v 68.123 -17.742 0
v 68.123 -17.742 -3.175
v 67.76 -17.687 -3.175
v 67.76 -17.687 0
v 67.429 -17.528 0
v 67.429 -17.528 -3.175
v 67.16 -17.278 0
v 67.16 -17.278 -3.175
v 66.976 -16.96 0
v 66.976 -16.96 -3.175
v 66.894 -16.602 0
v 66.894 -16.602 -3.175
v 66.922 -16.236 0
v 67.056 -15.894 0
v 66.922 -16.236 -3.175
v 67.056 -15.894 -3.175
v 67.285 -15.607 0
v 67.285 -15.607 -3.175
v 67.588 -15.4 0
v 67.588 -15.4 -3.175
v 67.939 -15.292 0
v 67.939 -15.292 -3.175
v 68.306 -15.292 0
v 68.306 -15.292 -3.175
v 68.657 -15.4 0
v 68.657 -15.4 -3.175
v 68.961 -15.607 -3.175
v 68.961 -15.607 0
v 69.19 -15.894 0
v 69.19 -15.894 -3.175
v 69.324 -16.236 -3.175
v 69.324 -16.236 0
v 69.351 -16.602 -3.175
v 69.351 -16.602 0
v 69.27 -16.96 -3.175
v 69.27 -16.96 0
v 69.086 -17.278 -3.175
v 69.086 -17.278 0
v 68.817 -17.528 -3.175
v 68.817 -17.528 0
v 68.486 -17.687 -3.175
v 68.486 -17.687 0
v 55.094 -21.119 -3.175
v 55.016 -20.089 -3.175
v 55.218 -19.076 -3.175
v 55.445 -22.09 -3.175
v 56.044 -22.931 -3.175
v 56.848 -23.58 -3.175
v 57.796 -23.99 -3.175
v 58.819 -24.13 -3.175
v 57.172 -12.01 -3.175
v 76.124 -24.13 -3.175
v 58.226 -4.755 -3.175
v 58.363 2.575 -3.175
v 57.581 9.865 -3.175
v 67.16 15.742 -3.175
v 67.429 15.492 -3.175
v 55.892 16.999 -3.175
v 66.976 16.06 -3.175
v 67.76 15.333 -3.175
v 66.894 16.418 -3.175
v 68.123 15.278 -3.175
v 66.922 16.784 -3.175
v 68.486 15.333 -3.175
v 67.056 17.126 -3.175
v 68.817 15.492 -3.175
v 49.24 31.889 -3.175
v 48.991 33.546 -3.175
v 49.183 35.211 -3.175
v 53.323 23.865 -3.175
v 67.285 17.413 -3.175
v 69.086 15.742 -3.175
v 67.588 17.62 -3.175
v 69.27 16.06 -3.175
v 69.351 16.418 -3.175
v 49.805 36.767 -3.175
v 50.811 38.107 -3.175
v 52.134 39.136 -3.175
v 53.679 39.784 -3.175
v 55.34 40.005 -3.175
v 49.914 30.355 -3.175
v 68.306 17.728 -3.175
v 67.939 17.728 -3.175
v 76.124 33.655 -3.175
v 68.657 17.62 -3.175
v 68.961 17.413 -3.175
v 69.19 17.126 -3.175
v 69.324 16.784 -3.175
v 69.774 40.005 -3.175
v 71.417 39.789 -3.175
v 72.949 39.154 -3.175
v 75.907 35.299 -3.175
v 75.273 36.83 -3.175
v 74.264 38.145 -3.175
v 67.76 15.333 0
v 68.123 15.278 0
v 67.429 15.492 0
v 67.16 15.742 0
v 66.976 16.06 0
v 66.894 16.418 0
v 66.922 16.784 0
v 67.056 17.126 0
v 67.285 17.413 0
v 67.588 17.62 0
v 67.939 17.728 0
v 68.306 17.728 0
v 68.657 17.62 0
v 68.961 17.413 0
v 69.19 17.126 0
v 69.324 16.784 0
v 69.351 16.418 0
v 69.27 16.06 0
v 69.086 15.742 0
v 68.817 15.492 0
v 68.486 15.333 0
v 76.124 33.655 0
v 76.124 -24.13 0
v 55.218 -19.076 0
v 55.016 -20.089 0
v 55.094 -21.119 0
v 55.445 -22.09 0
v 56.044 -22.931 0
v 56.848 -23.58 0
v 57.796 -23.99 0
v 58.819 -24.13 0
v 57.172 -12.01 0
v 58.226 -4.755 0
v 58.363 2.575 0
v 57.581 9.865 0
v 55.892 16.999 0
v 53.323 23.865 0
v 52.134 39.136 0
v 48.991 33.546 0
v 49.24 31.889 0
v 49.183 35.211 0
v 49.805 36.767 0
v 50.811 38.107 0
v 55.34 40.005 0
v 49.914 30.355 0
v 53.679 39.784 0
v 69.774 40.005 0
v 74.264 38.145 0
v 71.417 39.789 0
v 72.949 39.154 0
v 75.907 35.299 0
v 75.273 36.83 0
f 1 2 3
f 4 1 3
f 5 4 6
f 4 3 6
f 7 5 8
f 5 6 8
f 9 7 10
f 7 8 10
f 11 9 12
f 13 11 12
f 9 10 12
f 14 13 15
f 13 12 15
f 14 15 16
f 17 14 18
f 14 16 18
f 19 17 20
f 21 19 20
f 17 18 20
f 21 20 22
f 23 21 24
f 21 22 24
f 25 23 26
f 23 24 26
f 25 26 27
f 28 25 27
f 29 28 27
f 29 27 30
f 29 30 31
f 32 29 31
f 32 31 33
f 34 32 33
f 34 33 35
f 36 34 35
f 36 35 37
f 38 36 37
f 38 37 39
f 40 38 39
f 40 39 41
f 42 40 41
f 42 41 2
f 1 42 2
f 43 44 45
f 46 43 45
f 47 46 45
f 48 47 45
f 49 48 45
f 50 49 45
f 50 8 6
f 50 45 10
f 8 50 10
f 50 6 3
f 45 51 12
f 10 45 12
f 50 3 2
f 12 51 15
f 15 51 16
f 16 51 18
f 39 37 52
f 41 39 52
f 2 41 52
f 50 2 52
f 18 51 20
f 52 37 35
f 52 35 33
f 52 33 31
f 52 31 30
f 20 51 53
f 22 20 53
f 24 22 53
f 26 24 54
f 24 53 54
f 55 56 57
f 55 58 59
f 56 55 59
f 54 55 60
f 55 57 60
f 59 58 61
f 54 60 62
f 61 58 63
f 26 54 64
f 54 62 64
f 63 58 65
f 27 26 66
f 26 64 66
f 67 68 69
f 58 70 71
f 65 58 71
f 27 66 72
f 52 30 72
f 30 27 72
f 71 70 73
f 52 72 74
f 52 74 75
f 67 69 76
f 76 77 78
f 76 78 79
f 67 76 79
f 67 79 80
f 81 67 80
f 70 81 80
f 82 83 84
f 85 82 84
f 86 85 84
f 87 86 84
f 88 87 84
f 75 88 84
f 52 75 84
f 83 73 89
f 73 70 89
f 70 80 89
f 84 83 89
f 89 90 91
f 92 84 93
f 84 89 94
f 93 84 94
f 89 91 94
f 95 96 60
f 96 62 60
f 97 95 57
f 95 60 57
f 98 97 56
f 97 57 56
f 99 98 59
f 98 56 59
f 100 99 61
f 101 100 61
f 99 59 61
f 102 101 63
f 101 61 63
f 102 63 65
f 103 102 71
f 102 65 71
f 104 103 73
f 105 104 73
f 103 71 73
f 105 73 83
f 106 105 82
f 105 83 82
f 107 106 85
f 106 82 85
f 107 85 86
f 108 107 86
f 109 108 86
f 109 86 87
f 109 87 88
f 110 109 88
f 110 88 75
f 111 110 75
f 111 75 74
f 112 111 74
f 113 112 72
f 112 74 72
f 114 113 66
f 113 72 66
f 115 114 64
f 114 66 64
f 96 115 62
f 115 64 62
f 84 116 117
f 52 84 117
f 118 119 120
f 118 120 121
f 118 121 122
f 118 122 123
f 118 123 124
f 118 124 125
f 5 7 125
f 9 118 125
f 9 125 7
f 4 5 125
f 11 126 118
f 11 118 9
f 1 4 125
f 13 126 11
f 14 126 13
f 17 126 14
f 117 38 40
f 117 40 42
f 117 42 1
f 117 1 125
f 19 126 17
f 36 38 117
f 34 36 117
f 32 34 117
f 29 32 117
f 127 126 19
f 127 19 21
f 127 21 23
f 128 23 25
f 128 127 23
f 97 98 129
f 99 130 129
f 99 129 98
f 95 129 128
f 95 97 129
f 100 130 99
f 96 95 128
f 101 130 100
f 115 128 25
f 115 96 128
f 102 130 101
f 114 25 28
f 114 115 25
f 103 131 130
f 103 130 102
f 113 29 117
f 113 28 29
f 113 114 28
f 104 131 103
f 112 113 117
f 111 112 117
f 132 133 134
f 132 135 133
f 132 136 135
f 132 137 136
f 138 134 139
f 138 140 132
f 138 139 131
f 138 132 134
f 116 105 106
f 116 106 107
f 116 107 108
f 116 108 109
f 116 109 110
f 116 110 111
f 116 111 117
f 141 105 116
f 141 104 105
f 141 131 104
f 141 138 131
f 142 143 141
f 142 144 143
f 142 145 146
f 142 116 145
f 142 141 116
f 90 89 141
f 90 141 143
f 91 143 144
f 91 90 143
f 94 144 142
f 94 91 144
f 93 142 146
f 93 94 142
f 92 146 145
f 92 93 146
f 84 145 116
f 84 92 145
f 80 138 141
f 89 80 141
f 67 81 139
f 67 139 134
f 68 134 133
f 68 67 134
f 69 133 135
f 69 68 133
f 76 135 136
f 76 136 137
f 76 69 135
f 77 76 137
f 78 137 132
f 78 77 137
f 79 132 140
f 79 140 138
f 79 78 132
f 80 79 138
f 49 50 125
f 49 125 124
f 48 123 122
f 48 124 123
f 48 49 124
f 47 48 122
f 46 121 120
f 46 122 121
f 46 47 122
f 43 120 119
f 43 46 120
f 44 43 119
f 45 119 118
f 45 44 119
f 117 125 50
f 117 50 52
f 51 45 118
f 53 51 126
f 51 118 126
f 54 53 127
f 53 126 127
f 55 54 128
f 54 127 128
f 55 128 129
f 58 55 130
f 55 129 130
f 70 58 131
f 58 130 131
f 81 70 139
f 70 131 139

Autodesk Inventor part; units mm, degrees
ref_plane "YZ Plane" through (0, 0, 0) normal (1, 0, 0) x (0, 1, 0)
ref_plane "XZ Plane" through (0, 0, 0) normal (0, 1, 0) x (-1, 0, 0)
ref_plane "XY Plane" through (0, 0, 0) normal (0, 0, 1) x (1, 0, 0)
sketch "Sketch1" plane through (0, 0, 0) normal (0, 0, 1) x (1, 0, 0)
  line L0 (0, 54.7703) -> (0, -37.28) projected
  line L1 (-15.2248, 0) -> (91.3486, 0) projected
  arc A0 (53.2038, -24.13) -> (42.5734, 40.005) centre (0, 0) ccw
  line L2 (42.5734, 40.005) -> (76.1238, 40.005)
  line L3 (76.1238, 40.005) -> (76.1238, -24.13)
  line L4 (53.2038, -24.13) -> (76.1238, -24.13)
  point P0 (68.1228, 16.51)
  point P1 (68.1228, 0)
  point P2 (68.1228, -16.51)
  dimension "d0" = 58.42
  dimension "d1" = 40.005
  dimension "d2" = 24.13
  dimension "d69" = 76.1238
  dimension "d133" = 8.001
  dimension "d134" = 16.51
  dimension "d135" = 16.51
  dimension "d145" = 33.5504
  dimension "d146" = 64.135
extrude "Extrusion1" add sketch "Sketch1" against normal blind 3.175
hole "Hole6" at (68.1228, 16.51, 0) at (68.1228, -16.51, 0) direction (0, 0, -1) diameter 2.4638 end through all
fillet "Fillet11" radius 3.81 1 edges at (53.2038, -24.13, -1.5875)
fillet "Fillet12" radius 6.35 2 edges at (76.1238, 40.005, -1.5875) (42.5734, 40.005, -1.5875)
properties part number "J005357" material "STEEL, LOW CARBON (1008/1018/1020)"
